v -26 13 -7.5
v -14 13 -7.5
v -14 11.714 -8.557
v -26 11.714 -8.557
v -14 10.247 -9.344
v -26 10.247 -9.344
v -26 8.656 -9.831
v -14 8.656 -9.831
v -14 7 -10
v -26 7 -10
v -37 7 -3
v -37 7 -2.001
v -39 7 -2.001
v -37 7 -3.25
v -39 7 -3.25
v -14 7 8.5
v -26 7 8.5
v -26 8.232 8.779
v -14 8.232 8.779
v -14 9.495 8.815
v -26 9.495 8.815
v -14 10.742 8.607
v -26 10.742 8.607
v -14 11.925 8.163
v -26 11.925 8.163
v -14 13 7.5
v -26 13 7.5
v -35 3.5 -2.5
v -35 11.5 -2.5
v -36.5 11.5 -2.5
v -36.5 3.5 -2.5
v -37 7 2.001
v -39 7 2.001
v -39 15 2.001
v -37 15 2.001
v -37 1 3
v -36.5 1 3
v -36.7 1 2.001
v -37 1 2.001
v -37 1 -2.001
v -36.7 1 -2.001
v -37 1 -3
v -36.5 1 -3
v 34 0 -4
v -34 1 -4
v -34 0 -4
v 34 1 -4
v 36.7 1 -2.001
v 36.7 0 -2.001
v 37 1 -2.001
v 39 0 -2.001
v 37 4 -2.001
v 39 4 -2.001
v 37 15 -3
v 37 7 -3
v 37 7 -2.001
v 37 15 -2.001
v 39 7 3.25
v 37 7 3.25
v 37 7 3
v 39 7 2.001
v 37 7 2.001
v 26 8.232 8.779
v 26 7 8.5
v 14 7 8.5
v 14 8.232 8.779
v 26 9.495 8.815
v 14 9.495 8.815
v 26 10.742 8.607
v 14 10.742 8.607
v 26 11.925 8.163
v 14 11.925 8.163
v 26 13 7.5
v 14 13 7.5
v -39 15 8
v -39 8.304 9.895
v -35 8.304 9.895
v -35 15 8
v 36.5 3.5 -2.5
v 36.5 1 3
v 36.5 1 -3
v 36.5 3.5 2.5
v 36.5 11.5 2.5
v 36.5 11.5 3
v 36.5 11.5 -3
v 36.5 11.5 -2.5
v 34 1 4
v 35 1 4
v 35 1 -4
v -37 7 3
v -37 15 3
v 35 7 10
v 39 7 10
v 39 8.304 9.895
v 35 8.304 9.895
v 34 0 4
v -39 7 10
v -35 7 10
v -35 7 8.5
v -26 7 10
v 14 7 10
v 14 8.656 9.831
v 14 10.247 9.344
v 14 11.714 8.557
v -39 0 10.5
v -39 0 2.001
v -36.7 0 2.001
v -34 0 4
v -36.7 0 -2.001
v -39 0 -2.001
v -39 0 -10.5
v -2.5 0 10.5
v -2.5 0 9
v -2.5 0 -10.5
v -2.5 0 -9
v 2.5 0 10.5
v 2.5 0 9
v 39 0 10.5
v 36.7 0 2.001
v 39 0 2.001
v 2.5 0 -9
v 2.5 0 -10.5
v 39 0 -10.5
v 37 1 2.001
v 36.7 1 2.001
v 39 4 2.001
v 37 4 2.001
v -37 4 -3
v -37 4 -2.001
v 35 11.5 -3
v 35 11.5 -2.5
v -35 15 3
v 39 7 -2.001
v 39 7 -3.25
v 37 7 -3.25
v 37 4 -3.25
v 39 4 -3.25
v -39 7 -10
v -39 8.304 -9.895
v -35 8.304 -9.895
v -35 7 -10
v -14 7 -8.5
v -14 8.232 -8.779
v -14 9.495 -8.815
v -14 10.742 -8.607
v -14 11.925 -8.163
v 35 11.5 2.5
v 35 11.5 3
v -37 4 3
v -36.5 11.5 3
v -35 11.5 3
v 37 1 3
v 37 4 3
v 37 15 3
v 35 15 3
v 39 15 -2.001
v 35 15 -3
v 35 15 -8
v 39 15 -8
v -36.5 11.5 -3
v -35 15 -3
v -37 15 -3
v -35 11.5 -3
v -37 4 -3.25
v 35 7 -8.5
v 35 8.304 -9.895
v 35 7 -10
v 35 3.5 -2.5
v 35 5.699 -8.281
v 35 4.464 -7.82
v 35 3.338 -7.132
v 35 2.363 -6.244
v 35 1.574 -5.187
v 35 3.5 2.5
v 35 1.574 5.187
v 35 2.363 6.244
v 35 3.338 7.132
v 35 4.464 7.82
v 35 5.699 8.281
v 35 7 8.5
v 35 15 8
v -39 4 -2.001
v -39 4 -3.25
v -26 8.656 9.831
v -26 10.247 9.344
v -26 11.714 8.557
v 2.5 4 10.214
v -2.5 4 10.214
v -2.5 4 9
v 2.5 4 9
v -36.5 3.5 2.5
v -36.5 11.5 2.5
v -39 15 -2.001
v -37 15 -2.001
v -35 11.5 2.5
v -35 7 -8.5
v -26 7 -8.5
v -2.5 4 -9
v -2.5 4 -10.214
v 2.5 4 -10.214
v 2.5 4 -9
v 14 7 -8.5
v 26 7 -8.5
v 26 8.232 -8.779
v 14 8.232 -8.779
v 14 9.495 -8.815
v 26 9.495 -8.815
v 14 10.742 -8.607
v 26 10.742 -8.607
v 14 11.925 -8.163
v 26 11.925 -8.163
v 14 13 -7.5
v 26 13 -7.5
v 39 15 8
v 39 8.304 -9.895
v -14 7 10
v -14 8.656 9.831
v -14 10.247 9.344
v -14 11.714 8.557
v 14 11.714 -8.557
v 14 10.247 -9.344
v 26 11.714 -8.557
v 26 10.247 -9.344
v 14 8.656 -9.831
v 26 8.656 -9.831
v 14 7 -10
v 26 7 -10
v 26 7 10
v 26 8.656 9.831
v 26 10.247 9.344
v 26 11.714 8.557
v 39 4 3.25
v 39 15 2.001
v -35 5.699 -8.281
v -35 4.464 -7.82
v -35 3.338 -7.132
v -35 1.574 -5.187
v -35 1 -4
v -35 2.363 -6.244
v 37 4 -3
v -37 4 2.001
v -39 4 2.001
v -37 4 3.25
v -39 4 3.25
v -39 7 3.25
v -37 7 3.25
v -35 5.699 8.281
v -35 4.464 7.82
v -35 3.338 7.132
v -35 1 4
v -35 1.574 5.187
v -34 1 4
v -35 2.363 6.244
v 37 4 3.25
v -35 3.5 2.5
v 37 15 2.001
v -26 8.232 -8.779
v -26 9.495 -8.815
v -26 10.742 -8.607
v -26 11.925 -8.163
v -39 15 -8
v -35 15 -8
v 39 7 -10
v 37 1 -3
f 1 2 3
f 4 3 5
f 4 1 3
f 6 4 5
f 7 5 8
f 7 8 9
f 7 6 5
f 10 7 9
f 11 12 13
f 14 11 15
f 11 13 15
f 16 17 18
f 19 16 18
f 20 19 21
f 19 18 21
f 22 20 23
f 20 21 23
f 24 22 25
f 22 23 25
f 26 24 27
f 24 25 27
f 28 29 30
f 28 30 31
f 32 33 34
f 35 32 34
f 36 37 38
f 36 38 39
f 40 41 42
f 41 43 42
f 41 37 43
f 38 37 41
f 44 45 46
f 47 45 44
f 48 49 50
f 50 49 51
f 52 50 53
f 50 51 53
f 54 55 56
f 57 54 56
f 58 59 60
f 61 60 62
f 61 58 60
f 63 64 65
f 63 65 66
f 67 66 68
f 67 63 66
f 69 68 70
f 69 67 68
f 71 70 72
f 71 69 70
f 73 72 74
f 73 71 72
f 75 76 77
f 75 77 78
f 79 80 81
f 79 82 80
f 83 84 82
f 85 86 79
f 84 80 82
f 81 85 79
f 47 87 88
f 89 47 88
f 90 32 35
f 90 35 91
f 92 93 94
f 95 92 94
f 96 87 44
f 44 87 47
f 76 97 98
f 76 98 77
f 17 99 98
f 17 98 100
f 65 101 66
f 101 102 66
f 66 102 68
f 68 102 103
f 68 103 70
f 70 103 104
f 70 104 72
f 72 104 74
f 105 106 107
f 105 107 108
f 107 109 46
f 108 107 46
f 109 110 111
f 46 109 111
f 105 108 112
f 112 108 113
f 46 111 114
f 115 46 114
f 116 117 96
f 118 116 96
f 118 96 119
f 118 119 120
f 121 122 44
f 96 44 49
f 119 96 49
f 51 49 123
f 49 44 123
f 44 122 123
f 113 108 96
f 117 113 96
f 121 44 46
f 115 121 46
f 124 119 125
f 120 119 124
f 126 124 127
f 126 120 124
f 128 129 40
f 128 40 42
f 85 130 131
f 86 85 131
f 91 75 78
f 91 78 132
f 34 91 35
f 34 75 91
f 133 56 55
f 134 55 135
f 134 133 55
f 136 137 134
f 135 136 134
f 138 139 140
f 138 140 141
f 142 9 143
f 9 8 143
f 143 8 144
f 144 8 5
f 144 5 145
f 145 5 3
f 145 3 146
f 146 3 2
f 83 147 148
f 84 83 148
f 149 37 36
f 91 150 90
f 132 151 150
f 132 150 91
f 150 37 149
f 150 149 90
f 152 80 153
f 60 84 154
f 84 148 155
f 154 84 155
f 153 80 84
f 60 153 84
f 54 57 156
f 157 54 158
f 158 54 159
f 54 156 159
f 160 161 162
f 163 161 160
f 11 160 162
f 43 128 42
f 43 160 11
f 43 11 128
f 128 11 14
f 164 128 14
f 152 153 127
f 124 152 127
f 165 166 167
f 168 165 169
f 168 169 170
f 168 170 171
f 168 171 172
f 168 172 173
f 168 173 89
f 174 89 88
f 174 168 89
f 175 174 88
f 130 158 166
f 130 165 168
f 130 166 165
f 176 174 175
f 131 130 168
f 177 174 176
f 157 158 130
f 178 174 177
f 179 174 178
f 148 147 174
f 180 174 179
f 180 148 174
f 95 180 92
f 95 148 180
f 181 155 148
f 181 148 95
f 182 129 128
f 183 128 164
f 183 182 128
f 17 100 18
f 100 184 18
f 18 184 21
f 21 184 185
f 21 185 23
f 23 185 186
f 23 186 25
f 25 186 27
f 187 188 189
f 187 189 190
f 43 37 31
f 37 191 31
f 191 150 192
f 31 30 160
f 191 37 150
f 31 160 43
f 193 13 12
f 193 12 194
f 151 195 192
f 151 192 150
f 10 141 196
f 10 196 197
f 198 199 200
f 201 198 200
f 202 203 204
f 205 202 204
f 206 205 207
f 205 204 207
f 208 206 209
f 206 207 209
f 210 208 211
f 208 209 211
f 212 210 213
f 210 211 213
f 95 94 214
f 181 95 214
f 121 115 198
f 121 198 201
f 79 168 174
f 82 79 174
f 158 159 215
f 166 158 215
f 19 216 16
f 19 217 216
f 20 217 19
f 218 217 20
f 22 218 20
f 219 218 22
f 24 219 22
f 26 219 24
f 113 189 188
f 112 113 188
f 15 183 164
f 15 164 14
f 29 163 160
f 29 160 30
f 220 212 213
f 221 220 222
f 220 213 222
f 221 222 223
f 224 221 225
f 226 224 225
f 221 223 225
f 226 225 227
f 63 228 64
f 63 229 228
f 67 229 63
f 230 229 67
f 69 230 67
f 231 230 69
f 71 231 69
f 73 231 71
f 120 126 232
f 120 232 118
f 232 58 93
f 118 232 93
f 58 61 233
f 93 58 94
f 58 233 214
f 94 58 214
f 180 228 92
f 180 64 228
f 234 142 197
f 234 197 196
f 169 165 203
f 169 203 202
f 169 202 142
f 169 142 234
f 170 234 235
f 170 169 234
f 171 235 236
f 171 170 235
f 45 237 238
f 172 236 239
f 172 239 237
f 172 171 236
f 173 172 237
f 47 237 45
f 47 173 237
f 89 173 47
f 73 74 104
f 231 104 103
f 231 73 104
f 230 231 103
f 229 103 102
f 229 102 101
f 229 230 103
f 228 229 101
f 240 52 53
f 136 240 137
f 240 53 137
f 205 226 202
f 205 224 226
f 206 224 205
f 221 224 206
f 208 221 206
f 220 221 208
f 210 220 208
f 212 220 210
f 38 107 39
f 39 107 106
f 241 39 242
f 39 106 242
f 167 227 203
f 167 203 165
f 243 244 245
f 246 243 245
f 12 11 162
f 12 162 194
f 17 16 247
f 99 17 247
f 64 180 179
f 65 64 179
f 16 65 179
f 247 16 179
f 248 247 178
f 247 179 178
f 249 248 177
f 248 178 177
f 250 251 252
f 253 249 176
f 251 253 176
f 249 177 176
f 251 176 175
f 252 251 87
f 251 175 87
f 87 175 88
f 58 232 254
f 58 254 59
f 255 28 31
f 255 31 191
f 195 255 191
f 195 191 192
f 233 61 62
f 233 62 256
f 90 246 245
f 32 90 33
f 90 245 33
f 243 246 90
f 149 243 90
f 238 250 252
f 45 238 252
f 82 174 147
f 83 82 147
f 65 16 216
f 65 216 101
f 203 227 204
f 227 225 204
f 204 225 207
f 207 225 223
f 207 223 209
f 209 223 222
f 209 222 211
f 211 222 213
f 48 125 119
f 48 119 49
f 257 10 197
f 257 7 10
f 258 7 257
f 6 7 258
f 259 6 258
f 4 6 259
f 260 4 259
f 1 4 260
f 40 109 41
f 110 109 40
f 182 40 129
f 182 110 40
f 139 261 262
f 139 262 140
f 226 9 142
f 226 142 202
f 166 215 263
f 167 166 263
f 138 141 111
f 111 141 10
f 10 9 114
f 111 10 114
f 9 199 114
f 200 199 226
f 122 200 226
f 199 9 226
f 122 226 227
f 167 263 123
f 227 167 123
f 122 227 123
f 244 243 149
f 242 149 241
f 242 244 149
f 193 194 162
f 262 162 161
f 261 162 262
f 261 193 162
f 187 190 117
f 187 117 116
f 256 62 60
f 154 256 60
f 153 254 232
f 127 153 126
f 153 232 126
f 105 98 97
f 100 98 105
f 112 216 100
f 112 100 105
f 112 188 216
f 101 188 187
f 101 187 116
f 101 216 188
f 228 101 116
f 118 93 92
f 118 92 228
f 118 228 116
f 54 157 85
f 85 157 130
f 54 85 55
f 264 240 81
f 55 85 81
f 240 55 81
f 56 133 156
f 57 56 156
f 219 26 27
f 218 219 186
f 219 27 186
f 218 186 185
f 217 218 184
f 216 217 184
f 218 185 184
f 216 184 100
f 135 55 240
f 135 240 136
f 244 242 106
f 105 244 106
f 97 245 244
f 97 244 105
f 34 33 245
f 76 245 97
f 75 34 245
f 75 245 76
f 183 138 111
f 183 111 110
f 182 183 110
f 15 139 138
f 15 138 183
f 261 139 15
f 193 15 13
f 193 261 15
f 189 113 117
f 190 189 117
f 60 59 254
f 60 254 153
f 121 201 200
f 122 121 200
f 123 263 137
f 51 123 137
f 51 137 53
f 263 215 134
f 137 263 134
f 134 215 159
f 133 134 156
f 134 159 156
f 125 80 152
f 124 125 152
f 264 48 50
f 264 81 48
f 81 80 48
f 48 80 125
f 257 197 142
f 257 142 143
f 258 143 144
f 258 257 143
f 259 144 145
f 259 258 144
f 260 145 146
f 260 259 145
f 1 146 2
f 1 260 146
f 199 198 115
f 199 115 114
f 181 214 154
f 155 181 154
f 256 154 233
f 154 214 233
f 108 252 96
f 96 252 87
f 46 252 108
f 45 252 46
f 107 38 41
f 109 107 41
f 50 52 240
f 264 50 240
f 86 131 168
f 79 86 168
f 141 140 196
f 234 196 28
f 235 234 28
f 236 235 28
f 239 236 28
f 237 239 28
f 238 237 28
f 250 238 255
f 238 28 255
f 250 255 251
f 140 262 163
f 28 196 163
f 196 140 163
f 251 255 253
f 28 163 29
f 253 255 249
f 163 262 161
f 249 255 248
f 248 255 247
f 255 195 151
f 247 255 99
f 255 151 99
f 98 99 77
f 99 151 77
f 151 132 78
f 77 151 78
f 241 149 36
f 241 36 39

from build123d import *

# Parameters (mm, degrees)
SKETCH1_W            = 78
SKETCH1_H            = 21
BOSS_EXTRUDE1_DEPTH  = 7
CUT_EXTRUDE1_DEPTH   = 80.014239223
SKETCH3_W            = 70
SKETCH3_H            = 8
CUT_EXTRUDE2_DEPTH   = 6
CUT_EXTRUDE3_DEPTH   = 70
SKETCH5_W            = 68
SKETCH5_H            = 8
CUT_EXTRUDE4_DEPTH   = 41.831972766
BOSS_EXTRUDE2_DEPTH  = 12
MIRROR3_COPY_1_DEPTH = 12
BOSS_EXTRUDE3_DEPTH  = 4
SKETCH9_W            = 6.5
SKETCH9_H            = 3
CUT_EXTRUDE5_DEPTH   = 2
CUT_EXTRUDE6_DEPTH   = 2
SKETCH12_W           = 0.5
SKETCH12_H           = 6
CUT_EXTRUDE8_DEPTH   = 10.5
SKETCH13_W           = 4.001855858
SKETCH13_H           = 15
CUT_EXTRUDE9_DEPTH   = 2.3
SKETCH14_W           = 5
SKETCH14_H           = 1.5
CUT_EXTRUDE10_DEPTH  = 4


with BuildPart() as part:
    # Sketch1 → Boss-Extrude1 (new body)
    with BuildSketch(Plane(origin=(0, 0, 0), x_dir=(1, 0, 0), z_dir=(0, 1, 0))):
        Rectangle(SKETCH1_W, SKETCH1_H)
    extrude(amount=BOSS_EXTRUDE1_DEPTH)

    # Sketch2 → Cut-Extrude1 (cut, through all)
    with BuildSketch(Plane(origin=(39, 0, 0), x_dir=(0, 0, -1), z_dir=(1, 0, 0))):
        Polygon((10, 7), (10.5, 0), (10.5, 7), align=None)
        Polygon((-10, 7), (-10.5, 0), (-10.5, 7), align=None)
    extrude(amount=-CUT_EXTRUDE1_DEPTH, mode=Mode.SUBTRACT)

    # Sketch3 → Cut-Extrude2 (cut)
    with BuildSketch(Plane(origin=(0, 7, 0), x_dir=(1, 0, 0), z_dir=(0, 1, 0))):
        Rectangle(SKETCH3_W, SKETCH3_H)
    extrude(amount=-CUT_EXTRUDE2_DEPTH, mode=Mode.SUBTRACT)

    # Sketch4 → Cut-Extrude3 (cut)
    with BuildSketch(Plane(origin=(35, 0, 0), x_dir=(0, 0, -1), z_dir=(1, 0, 0))):
        with BuildLine():
            Line((4, 1), (4, 7))
            Line((4, 7), (8.5, 7))
            ThreePointArc((8.5, 7), (7.132310367, 3.338267225), (4, 1))
        make_face()
    cut_extrude3 = extrude(amount=-CUT_EXTRUDE3_DEPTH, mode=Mode.SUBTRACT)

    # Mirror1: Cut-Extrude3 across plane
    add(cut_extrude3.mirror(Plane.XY), mode=Mode.SUBTRACT)

    # Sketch5 → Cut-Extrude4 (cut, through all)
    with BuildSketch(Plane(origin=(0, 1, 0), x_dir=(1, 0, 0), z_dir=(0, 1, 0))):
        Rectangle(SKETCH5_W, SKETCH5_H)
    extrude(amount=-CUT_EXTRUDE4_DEPTH, mode=Mode.SUBTRACT)

    # Sketch6 → Boss-Extrude2 (add)
    with BuildSketch(Plane(origin=(26, 0, 0), x_dir=(0, 0, -1), z_dir=(1, 0, 0))):
        with BuildLine():
            Line((-10, 7), (-8.5, 7))
            ThreePointArc((-8.5, 7), (-8.740958247, 10.123493041), (-7.5, 13))
            ThreePointArc((-7.5, 13), (-9.343954985, 10.247481244), (-10, 7))
        make_face()
    boss_extrude2 = extrude(amount=-BOSS_EXTRUDE2_DEPTH)

    # Mirror2: Boss-Extrude2 across plane
    add(boss_extrude2.mirror(Plane(origin=(0, 0, 0), x_dir=(0, 0, 1), z_dir=(1, 0, 0))))

    # Mirror3: Boss-Extrude2 across plane
    add(boss_extrude2.mirror(Plane.XY))

    # Mirror3 copy 1 sketch → Mirror3 copy 1 (add)
    with BuildSketch(Plane.ZY.offset(26)):
        with BuildLine():
            Line((-10, 7), (-8.5, 7))
            ThreePointArc((-8.5, 7), (-8.740958247, 10.123493041), (-7.5, 13))
            ThreePointArc((-7.5, 13), (-9.343954985, 10.247481244), (-10, 7))
        make_face()
    extrude(amount=-MIRROR3_COPY_1_DEPTH)

    # Sketch8 → Boss-Extrude3 (add)
    with BuildSketch(Plane(origin=(39, 0, 0), x_dir=(0, 0, -1), z_dir=(1, 0, 0))):
        Polygon((-8, 15), (8, 15), (9.894572253, 8.304261216), (10, 7), (-10, 7), (-9.894572253, 8.304261216), align=None)
    boss_extrude3 = extrude(amount=-BOSS_EXTRUDE3_DEPTH)

    # Mirror4: Boss-Extrude3 across plane
    add(boss_extrude3.mirror(Plane(origin=(0, 0, 0), x_dir=(0, 0, 1), z_dir=(1, 0, 0))))

    # Sketch9 → Cut-Extrude5 (cut)
    with BuildSketch(Plane(origin=(39, 0, 0), x_dir=(0, 0, -1), z_dir=(1, 0, 0))):
        with Locations((0, 5.5)):
            Rectangle(SKETCH9_W, SKETCH9_H)
    cut_extrude5 = extrude(amount=-CUT_EXTRUDE5_DEPTH, mode=Mode.SUBTRACT)

    # Mirror5: Cut-Extrude5 across plane
    add(cut_extrude5.mirror(Plane(origin=(0, 0, 0), x_dir=(0, 0, 1), z_dir=(1, 0, 0))), mode=Mode.SUBTRACT)

    # Sketch11 → Cut-Extrude6 (cut)
    with BuildSketch(Plane.ZY.offset(-35)):
        Polygon((-2.5, 3.5), (2.5, 3.5), (2.5, 11.5), (3, 11.5), (3, 15), (-3, 15), (-3, 11.5), (-2.5, 11.5), align=None)
    cut_extrude6 = extrude(amount=-CUT_EXTRUDE6_DEPTH, mode=Mode.SUBTRACT)

    # Sketch12 → Cut-Extrude8 (cut)
    with BuildSketch(Plane(origin=(0, 11.5, 0), x_dir=(1, 0, 0), z_dir=(0, 1, 0))):
        with Locations((36.75, 0)):
            Rectangle(SKETCH12_W, SKETCH12_H)
    cut_extrude8 = extrude(amount=-CUT_EXTRUDE8_DEPTH, mode=Mode.SUBTRACT)

    # Sketch13 → Cut-Extrude9 (cut)
    with BuildSketch(Plane(origin=(39, 0, 0), x_dir=(0, 0, -1), z_dir=(1, 0, 0))):
        with Locations((0, 7.5)):
            Rectangle(SKETCH13_W, SKETCH13_H)
    cut_extrude9 = extrude(amount=-CUT_EXTRUDE9_DEPTH, mode=Mode.SUBTRACT)

    # Mirror6: Cut-Extrude6, Cut-Extrude8, Cut-Extrude9 across plane
    add(cut_extrude6.mirror(Plane(origin=(0, 0, 0), x_dir=(0, 0, 1), z_dir=(1, 0, 0))), mode=Mode.SUBTRACT)
    add(cut_extrude8.mirror(Plane(origin=(0, 0, 0), x_dir=(0, 0, 1), z_dir=(1, 0, 0))), mode=Mode.SUBTRACT)
    add(cut_extrude9.mirror(Plane(origin=(0, 0, 0), x_dir=(0, 0, 1), z_dir=(1, 0, 0))), mode=Mode.SUBTRACT)

    # Sketch14 → Cut-Extrude10 (cut)
    with BuildSketch(Plane.XZ):
        with Locations((0, 9.75)):
            Rectangle(SKETCH14_W, SKETCH14_H)
    cut_extrude10 = extrude(amount=-CUT_EXTRUDE10_DEPTH, mode=Mode.SUBTRACT)

    # Mirror7: Cut-Extrude10 across plane
    add(cut_extrude10.mirror(Plane.XY), mode=Mode.SUBTRACT)


solid = part.part
